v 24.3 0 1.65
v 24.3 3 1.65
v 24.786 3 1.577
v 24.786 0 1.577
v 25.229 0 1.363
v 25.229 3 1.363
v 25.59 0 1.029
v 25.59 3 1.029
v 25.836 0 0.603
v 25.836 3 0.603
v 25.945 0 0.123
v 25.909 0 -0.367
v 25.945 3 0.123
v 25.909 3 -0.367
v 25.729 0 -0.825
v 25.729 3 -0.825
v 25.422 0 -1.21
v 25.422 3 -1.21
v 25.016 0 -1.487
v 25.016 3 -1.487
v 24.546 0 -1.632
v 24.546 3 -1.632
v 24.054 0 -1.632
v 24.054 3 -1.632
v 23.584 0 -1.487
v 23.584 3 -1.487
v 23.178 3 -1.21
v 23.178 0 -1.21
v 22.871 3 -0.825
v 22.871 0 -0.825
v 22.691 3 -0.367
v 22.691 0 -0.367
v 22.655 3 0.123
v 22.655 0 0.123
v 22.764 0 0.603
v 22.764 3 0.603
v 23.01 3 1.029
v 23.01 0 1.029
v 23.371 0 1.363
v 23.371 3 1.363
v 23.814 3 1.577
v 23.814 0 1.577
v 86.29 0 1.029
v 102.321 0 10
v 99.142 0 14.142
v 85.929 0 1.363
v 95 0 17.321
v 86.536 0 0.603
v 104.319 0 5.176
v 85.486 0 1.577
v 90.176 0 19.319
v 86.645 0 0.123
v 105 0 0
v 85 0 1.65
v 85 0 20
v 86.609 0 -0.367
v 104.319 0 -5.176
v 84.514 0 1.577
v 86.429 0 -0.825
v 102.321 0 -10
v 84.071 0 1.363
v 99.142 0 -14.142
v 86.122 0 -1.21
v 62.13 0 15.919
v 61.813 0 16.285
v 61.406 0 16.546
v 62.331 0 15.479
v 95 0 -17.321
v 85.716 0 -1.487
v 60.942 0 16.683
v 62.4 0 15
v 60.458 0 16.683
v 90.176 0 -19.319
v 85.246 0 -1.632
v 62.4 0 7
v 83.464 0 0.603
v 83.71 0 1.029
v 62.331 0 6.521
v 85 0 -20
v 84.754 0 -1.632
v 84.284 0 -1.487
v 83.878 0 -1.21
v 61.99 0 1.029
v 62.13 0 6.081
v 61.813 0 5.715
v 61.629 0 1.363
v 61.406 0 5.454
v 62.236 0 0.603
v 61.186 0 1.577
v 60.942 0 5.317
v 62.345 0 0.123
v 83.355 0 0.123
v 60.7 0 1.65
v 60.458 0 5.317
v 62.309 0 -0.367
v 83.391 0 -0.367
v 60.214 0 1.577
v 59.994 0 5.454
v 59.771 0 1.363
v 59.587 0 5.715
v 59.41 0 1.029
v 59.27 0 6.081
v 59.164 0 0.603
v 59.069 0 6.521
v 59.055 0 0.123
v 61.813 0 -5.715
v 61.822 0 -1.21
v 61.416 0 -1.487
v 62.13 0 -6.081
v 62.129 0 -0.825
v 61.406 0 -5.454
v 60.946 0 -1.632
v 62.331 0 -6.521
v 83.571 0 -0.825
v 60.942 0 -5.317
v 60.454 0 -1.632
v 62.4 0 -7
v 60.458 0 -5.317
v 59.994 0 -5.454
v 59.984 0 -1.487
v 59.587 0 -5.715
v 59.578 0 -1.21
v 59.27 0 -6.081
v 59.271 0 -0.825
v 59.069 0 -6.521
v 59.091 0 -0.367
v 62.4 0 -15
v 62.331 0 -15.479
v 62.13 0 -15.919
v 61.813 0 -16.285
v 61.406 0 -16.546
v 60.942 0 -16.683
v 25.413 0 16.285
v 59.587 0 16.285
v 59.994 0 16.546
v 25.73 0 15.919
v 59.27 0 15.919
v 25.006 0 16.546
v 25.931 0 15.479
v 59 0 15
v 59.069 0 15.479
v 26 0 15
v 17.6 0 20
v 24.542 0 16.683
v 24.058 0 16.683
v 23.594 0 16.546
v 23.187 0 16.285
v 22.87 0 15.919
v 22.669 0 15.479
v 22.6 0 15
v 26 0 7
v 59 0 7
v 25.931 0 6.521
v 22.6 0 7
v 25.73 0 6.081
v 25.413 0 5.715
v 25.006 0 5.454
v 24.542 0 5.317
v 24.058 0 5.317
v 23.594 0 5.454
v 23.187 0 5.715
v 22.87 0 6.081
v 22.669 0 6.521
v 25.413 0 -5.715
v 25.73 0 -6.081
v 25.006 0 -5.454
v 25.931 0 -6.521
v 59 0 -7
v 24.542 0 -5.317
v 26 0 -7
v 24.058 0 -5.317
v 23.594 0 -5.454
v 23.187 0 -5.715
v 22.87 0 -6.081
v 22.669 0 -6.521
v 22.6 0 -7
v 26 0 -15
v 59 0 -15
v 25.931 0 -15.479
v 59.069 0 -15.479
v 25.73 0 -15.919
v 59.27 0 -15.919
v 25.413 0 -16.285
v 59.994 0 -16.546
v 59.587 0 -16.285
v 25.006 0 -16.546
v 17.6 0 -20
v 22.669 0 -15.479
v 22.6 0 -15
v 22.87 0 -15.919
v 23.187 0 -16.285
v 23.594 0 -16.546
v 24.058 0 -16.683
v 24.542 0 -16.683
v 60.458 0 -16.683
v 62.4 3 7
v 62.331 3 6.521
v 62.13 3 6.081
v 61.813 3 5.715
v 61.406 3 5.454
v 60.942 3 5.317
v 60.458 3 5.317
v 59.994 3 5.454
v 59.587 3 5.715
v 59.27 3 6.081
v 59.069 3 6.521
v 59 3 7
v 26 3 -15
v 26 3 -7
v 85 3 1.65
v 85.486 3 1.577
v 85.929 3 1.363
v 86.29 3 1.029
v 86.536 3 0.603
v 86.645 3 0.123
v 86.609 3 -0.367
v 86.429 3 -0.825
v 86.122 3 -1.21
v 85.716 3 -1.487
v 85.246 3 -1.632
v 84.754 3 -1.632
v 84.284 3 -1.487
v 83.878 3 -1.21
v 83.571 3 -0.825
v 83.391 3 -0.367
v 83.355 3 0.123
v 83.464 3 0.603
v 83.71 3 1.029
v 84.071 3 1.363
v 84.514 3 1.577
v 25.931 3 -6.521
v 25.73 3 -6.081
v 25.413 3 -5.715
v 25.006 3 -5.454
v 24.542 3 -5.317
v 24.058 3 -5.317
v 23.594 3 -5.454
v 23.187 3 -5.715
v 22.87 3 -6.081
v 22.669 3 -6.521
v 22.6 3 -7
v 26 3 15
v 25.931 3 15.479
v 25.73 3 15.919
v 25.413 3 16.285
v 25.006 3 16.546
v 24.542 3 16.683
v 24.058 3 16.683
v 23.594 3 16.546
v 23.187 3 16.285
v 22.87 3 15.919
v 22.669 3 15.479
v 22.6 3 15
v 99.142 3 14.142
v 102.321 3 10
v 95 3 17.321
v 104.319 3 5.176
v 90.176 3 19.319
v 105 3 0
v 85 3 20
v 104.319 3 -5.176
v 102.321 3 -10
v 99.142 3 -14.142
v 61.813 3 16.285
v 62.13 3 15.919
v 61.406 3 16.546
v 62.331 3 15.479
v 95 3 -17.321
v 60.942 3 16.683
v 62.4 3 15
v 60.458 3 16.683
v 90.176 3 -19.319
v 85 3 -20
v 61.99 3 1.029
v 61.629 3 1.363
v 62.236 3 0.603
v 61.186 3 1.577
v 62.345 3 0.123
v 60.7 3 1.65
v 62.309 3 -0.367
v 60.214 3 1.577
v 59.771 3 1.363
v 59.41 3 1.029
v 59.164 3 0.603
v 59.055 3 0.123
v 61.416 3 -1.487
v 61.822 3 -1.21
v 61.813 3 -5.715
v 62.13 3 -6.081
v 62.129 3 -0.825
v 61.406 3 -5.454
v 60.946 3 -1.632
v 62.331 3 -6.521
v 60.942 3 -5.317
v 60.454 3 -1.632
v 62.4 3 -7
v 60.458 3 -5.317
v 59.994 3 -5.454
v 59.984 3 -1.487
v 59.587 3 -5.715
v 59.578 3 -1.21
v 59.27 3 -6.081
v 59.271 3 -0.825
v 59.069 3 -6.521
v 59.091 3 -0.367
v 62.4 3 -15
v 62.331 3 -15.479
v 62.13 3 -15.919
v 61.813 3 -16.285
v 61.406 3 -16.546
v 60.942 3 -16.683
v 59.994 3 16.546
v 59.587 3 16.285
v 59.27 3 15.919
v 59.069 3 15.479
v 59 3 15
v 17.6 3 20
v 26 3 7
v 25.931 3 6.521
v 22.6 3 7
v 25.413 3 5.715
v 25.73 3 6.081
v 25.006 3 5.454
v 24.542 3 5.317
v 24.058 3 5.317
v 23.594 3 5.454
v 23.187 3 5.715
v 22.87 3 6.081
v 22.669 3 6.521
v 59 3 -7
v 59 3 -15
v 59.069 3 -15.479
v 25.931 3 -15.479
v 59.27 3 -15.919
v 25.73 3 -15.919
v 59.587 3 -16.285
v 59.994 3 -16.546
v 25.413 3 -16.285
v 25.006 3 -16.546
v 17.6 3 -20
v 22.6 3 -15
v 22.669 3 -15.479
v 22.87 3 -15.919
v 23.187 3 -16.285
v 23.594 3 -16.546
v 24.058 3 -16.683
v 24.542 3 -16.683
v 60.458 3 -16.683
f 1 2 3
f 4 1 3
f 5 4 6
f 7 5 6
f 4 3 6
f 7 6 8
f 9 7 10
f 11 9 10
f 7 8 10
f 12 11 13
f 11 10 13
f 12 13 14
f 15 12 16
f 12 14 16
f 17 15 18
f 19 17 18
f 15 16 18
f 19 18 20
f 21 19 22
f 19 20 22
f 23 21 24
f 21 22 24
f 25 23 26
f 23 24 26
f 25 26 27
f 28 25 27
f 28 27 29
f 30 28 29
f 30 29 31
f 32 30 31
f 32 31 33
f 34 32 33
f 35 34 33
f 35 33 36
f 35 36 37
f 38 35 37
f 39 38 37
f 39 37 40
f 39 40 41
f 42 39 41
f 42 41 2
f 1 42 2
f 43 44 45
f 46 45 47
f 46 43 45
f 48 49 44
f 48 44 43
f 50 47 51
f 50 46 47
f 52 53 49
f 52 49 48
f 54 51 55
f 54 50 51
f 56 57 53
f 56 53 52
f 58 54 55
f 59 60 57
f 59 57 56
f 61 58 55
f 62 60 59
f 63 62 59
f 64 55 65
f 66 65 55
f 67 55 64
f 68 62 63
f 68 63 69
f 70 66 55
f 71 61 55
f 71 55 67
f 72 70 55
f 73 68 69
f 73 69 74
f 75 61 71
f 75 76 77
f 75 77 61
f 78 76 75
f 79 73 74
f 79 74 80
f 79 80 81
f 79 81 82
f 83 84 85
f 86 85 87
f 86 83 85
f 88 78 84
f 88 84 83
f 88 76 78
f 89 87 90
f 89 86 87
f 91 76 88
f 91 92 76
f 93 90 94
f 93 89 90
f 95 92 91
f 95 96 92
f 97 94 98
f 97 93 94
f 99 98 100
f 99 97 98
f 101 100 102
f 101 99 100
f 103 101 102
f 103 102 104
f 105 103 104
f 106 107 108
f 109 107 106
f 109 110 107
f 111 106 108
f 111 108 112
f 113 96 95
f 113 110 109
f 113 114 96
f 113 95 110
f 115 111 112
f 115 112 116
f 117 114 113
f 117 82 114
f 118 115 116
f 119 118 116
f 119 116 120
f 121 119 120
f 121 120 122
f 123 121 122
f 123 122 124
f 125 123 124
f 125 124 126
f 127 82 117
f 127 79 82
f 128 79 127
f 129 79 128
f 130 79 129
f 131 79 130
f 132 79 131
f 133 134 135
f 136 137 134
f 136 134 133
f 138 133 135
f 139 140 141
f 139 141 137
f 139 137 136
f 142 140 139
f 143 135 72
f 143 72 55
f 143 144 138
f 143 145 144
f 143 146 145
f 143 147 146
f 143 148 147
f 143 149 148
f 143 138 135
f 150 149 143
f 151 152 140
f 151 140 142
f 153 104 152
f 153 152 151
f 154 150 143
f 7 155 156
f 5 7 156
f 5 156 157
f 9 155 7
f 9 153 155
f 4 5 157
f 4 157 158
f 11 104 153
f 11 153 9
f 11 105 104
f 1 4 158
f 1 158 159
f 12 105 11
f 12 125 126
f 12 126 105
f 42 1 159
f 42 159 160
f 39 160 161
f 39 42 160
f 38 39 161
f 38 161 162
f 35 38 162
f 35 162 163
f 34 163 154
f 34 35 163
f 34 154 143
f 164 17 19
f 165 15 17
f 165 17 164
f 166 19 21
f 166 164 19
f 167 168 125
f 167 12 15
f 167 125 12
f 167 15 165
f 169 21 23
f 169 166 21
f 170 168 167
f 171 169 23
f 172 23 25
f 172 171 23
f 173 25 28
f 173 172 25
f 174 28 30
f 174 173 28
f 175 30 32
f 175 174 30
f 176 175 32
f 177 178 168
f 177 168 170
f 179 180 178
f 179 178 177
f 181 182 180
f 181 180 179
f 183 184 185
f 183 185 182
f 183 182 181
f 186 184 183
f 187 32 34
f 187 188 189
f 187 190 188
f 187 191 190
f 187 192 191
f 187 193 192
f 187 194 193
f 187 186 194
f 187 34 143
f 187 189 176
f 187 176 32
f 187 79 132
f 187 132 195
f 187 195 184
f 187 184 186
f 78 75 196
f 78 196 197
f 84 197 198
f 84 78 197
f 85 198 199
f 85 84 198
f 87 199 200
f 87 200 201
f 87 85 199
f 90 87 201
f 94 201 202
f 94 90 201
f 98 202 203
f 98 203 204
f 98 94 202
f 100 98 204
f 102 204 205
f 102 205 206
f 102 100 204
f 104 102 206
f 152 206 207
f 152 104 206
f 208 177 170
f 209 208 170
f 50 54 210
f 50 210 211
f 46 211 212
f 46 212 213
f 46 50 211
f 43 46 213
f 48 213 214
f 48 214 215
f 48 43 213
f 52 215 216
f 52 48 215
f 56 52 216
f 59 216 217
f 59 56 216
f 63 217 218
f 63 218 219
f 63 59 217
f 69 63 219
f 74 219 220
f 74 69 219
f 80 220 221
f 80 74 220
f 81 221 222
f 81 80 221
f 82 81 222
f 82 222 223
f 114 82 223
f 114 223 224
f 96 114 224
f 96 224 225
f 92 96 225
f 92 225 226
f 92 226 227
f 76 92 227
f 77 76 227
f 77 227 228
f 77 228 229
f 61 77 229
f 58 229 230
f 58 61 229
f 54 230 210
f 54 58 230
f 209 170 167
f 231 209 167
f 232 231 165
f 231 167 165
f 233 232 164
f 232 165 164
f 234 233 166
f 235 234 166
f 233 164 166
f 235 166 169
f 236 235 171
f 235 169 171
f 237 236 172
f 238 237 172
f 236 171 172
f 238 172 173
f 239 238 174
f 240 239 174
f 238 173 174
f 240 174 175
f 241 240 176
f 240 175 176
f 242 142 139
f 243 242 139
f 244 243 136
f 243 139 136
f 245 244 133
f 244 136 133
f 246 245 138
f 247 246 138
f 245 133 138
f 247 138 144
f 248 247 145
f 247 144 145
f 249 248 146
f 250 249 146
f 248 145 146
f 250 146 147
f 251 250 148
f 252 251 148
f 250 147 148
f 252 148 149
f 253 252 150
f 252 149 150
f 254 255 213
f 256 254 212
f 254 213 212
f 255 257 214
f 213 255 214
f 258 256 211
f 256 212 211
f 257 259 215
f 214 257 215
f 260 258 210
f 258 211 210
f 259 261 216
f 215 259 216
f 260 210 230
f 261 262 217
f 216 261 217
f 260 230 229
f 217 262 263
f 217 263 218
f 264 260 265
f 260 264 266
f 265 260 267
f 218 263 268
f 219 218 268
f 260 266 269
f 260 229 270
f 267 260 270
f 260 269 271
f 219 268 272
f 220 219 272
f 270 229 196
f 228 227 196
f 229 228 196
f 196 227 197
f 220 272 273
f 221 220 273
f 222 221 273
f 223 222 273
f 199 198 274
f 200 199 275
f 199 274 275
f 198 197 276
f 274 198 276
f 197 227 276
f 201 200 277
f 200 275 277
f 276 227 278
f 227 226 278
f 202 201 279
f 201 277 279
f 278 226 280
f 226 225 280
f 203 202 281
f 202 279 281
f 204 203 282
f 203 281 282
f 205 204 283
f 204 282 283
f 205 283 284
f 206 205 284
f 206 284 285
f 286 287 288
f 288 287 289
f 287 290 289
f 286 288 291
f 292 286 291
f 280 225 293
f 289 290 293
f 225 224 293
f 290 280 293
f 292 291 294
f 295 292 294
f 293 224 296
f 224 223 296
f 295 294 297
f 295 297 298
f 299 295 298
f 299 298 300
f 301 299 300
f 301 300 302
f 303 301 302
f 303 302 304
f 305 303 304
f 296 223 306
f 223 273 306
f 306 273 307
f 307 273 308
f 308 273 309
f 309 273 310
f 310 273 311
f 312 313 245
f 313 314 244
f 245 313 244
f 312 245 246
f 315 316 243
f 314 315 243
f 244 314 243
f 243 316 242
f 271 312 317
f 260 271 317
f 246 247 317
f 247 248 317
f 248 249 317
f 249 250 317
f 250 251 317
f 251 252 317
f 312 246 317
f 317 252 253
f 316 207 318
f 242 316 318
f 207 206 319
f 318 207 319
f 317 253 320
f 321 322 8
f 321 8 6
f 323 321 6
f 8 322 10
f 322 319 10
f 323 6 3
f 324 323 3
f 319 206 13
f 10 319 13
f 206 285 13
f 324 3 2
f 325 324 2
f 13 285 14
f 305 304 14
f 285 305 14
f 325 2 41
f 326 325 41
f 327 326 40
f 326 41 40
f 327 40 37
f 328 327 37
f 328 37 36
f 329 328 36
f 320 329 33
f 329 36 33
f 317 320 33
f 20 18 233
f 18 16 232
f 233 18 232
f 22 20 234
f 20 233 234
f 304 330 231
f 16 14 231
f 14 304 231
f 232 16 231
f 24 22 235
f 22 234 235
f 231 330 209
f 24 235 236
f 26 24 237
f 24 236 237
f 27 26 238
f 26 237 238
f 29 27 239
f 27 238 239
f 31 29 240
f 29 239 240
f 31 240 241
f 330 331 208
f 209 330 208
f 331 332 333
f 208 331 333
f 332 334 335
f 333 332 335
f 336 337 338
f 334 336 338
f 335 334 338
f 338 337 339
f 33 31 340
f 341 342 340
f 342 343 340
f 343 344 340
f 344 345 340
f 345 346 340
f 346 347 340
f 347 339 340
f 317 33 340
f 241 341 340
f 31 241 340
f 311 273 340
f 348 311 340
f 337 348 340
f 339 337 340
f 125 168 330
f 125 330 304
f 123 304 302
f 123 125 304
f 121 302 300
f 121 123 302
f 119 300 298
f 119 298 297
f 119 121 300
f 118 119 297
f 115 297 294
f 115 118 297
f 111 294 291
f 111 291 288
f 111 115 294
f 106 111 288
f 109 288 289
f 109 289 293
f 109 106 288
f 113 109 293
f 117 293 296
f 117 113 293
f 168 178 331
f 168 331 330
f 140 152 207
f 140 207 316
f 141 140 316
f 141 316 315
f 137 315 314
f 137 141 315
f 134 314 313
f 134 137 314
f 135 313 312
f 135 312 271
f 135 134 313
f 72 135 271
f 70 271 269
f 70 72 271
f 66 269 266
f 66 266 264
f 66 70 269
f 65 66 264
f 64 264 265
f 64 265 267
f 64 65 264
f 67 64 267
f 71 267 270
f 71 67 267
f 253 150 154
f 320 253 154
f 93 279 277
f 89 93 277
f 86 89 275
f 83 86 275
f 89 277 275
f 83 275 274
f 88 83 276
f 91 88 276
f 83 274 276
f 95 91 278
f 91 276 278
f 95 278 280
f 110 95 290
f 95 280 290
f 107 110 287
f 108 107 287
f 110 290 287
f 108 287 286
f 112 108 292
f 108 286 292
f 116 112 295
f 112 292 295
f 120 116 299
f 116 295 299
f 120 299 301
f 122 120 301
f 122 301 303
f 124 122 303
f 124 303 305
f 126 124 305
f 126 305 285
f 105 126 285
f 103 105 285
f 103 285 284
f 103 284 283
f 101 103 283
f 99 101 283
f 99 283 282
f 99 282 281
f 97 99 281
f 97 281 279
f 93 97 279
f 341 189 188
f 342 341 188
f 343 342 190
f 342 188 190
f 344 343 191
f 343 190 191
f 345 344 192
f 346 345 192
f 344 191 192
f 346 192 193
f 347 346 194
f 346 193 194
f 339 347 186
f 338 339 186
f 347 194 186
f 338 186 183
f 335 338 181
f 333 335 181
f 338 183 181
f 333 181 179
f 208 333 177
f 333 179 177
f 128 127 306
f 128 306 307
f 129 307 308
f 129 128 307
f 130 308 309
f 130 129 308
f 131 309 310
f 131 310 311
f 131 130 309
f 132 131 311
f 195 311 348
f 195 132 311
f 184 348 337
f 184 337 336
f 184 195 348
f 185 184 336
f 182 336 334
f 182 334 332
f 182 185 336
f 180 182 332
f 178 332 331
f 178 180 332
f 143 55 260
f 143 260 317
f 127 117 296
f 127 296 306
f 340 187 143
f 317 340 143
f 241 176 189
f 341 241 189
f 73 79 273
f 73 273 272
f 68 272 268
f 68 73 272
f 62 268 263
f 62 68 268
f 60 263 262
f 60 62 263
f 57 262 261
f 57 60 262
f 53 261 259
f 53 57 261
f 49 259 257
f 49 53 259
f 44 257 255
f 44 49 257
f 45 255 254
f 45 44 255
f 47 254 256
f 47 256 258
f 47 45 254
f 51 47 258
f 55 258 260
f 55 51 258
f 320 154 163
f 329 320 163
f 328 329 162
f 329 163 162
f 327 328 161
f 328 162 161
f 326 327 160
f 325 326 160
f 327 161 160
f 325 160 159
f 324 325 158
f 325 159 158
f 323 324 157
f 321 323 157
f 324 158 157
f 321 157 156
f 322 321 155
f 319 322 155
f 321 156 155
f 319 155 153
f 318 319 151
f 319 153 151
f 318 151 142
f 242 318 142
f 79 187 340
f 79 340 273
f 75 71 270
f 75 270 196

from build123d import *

# Parameters (mm, degrees)
SKETCH_1_R          = 1.65
EXTRUDE_1_DEPTH     = 3
SKETCH_2_R          = 1.65
CUT_EXTRUDE_1_DEPTH = 10
SKETCH_3_W          = 41.485680135
SKETCH_3_H          = 40
CUT_EXTRUDE_2_DEPTH = 10


with BuildPart() as part:
    # 草图1 → 凸台-拉伸1 (new body)
    with BuildSketch(Plane(origin=(0, 0, 0), x_dir=(1, 0, 0), z_dir=(0, 1, 0))):
        with BuildLine():
            Line((0, 20), (85, 20))
            ThreePointArc((85, 20), (105, 0), (85, -20))
            Line((85, -20), (0, -20))
            ThreePointArc((0, -20), (-20, 0), (0, 20))
        make_face()
        with Locations(Location((0, 0, 0), (0, 0, 270))):
            Circle(SKETCH_1_R, mode=Mode.SUBTRACT)
        with Locations(Location((85, 0, 0), (0, 0, 270))):
            Circle(SKETCH_1_R, mode=Mode.SUBTRACT)
        with BuildLine():
            Line((26, 15), (26, 7))
            ThreePointArc((26, 7), (24.3, 5.3), (22.6, 7))
            Line((22.6, 7), (22.6, 15))
            ThreePointArc((22.6, 15), (24.3, 16.7), (26, 15))
        make_face(mode=Mode.SUBTRACT)
        with BuildLine():
            Line((26, -7), (26, -15))
            ThreePointArc((26, -15), (24.3, -16.7), (22.6, -15))
            Line((22.6, -15), (22.6, -7))
            ThreePointArc((22.6, -7), (24.3, -5.3), (26, -7))
        make_face(mode=Mode.SUBTRACT)
        with BuildLine():
            Line((59, -7), (59, -15))
            ThreePointArc((59, -15), (60.7, -16.7), (62.4, -15))
            Line((62.4, -15), (62.4, -7))
            ThreePointArc((62.4, -7), (60.7, -5.3), (59, -7))
        make_face(mode=Mode.SUBTRACT)
        with BuildLine():
            Line((59, 15), (59, 7))
            ThreePointArc((59, 7), (60.7, 5.3), (62.4, 7))
            Line((62.4, 7), (62.4, 15))
            ThreePointArc((62.4, 15), (60.7, 16.7), (59, 15))
        make_face(mode=Mode.SUBTRACT)
    extrude(amount=EXTRUDE_1_DEPTH)

    # 草图2 → 切除-拉伸1 (cut)
    with BuildSketch(Plane(origin=(0, 3, 0), x_dir=(1, 0, 0), z_dir=(0, 1, 0))):
        with Locations(Location((24.3, 0, 0), (0, 0, 270))):
            Circle(SKETCH_2_R)
        with Locations(Location((60.7, 0, 0), (0, 0, 270))):
            Circle(SKETCH_2_R)
    extrude(amount=-CUT_EXTRUDE_1_DEPTH, mode=Mode.SUBTRACT)

    # 草图3 → 切除-拉伸2 (cut)
    with BuildSketch(Plane.XZ):
        with Locations((-3.142840067, 0)):
            Rectangle(SKETCH_3_W, SKETCH_3_H)
    extrude(amount=-CUT_EXTRUDE_2_DEPTH, mode=Mode.SUBTRACT)


solid = part.part
